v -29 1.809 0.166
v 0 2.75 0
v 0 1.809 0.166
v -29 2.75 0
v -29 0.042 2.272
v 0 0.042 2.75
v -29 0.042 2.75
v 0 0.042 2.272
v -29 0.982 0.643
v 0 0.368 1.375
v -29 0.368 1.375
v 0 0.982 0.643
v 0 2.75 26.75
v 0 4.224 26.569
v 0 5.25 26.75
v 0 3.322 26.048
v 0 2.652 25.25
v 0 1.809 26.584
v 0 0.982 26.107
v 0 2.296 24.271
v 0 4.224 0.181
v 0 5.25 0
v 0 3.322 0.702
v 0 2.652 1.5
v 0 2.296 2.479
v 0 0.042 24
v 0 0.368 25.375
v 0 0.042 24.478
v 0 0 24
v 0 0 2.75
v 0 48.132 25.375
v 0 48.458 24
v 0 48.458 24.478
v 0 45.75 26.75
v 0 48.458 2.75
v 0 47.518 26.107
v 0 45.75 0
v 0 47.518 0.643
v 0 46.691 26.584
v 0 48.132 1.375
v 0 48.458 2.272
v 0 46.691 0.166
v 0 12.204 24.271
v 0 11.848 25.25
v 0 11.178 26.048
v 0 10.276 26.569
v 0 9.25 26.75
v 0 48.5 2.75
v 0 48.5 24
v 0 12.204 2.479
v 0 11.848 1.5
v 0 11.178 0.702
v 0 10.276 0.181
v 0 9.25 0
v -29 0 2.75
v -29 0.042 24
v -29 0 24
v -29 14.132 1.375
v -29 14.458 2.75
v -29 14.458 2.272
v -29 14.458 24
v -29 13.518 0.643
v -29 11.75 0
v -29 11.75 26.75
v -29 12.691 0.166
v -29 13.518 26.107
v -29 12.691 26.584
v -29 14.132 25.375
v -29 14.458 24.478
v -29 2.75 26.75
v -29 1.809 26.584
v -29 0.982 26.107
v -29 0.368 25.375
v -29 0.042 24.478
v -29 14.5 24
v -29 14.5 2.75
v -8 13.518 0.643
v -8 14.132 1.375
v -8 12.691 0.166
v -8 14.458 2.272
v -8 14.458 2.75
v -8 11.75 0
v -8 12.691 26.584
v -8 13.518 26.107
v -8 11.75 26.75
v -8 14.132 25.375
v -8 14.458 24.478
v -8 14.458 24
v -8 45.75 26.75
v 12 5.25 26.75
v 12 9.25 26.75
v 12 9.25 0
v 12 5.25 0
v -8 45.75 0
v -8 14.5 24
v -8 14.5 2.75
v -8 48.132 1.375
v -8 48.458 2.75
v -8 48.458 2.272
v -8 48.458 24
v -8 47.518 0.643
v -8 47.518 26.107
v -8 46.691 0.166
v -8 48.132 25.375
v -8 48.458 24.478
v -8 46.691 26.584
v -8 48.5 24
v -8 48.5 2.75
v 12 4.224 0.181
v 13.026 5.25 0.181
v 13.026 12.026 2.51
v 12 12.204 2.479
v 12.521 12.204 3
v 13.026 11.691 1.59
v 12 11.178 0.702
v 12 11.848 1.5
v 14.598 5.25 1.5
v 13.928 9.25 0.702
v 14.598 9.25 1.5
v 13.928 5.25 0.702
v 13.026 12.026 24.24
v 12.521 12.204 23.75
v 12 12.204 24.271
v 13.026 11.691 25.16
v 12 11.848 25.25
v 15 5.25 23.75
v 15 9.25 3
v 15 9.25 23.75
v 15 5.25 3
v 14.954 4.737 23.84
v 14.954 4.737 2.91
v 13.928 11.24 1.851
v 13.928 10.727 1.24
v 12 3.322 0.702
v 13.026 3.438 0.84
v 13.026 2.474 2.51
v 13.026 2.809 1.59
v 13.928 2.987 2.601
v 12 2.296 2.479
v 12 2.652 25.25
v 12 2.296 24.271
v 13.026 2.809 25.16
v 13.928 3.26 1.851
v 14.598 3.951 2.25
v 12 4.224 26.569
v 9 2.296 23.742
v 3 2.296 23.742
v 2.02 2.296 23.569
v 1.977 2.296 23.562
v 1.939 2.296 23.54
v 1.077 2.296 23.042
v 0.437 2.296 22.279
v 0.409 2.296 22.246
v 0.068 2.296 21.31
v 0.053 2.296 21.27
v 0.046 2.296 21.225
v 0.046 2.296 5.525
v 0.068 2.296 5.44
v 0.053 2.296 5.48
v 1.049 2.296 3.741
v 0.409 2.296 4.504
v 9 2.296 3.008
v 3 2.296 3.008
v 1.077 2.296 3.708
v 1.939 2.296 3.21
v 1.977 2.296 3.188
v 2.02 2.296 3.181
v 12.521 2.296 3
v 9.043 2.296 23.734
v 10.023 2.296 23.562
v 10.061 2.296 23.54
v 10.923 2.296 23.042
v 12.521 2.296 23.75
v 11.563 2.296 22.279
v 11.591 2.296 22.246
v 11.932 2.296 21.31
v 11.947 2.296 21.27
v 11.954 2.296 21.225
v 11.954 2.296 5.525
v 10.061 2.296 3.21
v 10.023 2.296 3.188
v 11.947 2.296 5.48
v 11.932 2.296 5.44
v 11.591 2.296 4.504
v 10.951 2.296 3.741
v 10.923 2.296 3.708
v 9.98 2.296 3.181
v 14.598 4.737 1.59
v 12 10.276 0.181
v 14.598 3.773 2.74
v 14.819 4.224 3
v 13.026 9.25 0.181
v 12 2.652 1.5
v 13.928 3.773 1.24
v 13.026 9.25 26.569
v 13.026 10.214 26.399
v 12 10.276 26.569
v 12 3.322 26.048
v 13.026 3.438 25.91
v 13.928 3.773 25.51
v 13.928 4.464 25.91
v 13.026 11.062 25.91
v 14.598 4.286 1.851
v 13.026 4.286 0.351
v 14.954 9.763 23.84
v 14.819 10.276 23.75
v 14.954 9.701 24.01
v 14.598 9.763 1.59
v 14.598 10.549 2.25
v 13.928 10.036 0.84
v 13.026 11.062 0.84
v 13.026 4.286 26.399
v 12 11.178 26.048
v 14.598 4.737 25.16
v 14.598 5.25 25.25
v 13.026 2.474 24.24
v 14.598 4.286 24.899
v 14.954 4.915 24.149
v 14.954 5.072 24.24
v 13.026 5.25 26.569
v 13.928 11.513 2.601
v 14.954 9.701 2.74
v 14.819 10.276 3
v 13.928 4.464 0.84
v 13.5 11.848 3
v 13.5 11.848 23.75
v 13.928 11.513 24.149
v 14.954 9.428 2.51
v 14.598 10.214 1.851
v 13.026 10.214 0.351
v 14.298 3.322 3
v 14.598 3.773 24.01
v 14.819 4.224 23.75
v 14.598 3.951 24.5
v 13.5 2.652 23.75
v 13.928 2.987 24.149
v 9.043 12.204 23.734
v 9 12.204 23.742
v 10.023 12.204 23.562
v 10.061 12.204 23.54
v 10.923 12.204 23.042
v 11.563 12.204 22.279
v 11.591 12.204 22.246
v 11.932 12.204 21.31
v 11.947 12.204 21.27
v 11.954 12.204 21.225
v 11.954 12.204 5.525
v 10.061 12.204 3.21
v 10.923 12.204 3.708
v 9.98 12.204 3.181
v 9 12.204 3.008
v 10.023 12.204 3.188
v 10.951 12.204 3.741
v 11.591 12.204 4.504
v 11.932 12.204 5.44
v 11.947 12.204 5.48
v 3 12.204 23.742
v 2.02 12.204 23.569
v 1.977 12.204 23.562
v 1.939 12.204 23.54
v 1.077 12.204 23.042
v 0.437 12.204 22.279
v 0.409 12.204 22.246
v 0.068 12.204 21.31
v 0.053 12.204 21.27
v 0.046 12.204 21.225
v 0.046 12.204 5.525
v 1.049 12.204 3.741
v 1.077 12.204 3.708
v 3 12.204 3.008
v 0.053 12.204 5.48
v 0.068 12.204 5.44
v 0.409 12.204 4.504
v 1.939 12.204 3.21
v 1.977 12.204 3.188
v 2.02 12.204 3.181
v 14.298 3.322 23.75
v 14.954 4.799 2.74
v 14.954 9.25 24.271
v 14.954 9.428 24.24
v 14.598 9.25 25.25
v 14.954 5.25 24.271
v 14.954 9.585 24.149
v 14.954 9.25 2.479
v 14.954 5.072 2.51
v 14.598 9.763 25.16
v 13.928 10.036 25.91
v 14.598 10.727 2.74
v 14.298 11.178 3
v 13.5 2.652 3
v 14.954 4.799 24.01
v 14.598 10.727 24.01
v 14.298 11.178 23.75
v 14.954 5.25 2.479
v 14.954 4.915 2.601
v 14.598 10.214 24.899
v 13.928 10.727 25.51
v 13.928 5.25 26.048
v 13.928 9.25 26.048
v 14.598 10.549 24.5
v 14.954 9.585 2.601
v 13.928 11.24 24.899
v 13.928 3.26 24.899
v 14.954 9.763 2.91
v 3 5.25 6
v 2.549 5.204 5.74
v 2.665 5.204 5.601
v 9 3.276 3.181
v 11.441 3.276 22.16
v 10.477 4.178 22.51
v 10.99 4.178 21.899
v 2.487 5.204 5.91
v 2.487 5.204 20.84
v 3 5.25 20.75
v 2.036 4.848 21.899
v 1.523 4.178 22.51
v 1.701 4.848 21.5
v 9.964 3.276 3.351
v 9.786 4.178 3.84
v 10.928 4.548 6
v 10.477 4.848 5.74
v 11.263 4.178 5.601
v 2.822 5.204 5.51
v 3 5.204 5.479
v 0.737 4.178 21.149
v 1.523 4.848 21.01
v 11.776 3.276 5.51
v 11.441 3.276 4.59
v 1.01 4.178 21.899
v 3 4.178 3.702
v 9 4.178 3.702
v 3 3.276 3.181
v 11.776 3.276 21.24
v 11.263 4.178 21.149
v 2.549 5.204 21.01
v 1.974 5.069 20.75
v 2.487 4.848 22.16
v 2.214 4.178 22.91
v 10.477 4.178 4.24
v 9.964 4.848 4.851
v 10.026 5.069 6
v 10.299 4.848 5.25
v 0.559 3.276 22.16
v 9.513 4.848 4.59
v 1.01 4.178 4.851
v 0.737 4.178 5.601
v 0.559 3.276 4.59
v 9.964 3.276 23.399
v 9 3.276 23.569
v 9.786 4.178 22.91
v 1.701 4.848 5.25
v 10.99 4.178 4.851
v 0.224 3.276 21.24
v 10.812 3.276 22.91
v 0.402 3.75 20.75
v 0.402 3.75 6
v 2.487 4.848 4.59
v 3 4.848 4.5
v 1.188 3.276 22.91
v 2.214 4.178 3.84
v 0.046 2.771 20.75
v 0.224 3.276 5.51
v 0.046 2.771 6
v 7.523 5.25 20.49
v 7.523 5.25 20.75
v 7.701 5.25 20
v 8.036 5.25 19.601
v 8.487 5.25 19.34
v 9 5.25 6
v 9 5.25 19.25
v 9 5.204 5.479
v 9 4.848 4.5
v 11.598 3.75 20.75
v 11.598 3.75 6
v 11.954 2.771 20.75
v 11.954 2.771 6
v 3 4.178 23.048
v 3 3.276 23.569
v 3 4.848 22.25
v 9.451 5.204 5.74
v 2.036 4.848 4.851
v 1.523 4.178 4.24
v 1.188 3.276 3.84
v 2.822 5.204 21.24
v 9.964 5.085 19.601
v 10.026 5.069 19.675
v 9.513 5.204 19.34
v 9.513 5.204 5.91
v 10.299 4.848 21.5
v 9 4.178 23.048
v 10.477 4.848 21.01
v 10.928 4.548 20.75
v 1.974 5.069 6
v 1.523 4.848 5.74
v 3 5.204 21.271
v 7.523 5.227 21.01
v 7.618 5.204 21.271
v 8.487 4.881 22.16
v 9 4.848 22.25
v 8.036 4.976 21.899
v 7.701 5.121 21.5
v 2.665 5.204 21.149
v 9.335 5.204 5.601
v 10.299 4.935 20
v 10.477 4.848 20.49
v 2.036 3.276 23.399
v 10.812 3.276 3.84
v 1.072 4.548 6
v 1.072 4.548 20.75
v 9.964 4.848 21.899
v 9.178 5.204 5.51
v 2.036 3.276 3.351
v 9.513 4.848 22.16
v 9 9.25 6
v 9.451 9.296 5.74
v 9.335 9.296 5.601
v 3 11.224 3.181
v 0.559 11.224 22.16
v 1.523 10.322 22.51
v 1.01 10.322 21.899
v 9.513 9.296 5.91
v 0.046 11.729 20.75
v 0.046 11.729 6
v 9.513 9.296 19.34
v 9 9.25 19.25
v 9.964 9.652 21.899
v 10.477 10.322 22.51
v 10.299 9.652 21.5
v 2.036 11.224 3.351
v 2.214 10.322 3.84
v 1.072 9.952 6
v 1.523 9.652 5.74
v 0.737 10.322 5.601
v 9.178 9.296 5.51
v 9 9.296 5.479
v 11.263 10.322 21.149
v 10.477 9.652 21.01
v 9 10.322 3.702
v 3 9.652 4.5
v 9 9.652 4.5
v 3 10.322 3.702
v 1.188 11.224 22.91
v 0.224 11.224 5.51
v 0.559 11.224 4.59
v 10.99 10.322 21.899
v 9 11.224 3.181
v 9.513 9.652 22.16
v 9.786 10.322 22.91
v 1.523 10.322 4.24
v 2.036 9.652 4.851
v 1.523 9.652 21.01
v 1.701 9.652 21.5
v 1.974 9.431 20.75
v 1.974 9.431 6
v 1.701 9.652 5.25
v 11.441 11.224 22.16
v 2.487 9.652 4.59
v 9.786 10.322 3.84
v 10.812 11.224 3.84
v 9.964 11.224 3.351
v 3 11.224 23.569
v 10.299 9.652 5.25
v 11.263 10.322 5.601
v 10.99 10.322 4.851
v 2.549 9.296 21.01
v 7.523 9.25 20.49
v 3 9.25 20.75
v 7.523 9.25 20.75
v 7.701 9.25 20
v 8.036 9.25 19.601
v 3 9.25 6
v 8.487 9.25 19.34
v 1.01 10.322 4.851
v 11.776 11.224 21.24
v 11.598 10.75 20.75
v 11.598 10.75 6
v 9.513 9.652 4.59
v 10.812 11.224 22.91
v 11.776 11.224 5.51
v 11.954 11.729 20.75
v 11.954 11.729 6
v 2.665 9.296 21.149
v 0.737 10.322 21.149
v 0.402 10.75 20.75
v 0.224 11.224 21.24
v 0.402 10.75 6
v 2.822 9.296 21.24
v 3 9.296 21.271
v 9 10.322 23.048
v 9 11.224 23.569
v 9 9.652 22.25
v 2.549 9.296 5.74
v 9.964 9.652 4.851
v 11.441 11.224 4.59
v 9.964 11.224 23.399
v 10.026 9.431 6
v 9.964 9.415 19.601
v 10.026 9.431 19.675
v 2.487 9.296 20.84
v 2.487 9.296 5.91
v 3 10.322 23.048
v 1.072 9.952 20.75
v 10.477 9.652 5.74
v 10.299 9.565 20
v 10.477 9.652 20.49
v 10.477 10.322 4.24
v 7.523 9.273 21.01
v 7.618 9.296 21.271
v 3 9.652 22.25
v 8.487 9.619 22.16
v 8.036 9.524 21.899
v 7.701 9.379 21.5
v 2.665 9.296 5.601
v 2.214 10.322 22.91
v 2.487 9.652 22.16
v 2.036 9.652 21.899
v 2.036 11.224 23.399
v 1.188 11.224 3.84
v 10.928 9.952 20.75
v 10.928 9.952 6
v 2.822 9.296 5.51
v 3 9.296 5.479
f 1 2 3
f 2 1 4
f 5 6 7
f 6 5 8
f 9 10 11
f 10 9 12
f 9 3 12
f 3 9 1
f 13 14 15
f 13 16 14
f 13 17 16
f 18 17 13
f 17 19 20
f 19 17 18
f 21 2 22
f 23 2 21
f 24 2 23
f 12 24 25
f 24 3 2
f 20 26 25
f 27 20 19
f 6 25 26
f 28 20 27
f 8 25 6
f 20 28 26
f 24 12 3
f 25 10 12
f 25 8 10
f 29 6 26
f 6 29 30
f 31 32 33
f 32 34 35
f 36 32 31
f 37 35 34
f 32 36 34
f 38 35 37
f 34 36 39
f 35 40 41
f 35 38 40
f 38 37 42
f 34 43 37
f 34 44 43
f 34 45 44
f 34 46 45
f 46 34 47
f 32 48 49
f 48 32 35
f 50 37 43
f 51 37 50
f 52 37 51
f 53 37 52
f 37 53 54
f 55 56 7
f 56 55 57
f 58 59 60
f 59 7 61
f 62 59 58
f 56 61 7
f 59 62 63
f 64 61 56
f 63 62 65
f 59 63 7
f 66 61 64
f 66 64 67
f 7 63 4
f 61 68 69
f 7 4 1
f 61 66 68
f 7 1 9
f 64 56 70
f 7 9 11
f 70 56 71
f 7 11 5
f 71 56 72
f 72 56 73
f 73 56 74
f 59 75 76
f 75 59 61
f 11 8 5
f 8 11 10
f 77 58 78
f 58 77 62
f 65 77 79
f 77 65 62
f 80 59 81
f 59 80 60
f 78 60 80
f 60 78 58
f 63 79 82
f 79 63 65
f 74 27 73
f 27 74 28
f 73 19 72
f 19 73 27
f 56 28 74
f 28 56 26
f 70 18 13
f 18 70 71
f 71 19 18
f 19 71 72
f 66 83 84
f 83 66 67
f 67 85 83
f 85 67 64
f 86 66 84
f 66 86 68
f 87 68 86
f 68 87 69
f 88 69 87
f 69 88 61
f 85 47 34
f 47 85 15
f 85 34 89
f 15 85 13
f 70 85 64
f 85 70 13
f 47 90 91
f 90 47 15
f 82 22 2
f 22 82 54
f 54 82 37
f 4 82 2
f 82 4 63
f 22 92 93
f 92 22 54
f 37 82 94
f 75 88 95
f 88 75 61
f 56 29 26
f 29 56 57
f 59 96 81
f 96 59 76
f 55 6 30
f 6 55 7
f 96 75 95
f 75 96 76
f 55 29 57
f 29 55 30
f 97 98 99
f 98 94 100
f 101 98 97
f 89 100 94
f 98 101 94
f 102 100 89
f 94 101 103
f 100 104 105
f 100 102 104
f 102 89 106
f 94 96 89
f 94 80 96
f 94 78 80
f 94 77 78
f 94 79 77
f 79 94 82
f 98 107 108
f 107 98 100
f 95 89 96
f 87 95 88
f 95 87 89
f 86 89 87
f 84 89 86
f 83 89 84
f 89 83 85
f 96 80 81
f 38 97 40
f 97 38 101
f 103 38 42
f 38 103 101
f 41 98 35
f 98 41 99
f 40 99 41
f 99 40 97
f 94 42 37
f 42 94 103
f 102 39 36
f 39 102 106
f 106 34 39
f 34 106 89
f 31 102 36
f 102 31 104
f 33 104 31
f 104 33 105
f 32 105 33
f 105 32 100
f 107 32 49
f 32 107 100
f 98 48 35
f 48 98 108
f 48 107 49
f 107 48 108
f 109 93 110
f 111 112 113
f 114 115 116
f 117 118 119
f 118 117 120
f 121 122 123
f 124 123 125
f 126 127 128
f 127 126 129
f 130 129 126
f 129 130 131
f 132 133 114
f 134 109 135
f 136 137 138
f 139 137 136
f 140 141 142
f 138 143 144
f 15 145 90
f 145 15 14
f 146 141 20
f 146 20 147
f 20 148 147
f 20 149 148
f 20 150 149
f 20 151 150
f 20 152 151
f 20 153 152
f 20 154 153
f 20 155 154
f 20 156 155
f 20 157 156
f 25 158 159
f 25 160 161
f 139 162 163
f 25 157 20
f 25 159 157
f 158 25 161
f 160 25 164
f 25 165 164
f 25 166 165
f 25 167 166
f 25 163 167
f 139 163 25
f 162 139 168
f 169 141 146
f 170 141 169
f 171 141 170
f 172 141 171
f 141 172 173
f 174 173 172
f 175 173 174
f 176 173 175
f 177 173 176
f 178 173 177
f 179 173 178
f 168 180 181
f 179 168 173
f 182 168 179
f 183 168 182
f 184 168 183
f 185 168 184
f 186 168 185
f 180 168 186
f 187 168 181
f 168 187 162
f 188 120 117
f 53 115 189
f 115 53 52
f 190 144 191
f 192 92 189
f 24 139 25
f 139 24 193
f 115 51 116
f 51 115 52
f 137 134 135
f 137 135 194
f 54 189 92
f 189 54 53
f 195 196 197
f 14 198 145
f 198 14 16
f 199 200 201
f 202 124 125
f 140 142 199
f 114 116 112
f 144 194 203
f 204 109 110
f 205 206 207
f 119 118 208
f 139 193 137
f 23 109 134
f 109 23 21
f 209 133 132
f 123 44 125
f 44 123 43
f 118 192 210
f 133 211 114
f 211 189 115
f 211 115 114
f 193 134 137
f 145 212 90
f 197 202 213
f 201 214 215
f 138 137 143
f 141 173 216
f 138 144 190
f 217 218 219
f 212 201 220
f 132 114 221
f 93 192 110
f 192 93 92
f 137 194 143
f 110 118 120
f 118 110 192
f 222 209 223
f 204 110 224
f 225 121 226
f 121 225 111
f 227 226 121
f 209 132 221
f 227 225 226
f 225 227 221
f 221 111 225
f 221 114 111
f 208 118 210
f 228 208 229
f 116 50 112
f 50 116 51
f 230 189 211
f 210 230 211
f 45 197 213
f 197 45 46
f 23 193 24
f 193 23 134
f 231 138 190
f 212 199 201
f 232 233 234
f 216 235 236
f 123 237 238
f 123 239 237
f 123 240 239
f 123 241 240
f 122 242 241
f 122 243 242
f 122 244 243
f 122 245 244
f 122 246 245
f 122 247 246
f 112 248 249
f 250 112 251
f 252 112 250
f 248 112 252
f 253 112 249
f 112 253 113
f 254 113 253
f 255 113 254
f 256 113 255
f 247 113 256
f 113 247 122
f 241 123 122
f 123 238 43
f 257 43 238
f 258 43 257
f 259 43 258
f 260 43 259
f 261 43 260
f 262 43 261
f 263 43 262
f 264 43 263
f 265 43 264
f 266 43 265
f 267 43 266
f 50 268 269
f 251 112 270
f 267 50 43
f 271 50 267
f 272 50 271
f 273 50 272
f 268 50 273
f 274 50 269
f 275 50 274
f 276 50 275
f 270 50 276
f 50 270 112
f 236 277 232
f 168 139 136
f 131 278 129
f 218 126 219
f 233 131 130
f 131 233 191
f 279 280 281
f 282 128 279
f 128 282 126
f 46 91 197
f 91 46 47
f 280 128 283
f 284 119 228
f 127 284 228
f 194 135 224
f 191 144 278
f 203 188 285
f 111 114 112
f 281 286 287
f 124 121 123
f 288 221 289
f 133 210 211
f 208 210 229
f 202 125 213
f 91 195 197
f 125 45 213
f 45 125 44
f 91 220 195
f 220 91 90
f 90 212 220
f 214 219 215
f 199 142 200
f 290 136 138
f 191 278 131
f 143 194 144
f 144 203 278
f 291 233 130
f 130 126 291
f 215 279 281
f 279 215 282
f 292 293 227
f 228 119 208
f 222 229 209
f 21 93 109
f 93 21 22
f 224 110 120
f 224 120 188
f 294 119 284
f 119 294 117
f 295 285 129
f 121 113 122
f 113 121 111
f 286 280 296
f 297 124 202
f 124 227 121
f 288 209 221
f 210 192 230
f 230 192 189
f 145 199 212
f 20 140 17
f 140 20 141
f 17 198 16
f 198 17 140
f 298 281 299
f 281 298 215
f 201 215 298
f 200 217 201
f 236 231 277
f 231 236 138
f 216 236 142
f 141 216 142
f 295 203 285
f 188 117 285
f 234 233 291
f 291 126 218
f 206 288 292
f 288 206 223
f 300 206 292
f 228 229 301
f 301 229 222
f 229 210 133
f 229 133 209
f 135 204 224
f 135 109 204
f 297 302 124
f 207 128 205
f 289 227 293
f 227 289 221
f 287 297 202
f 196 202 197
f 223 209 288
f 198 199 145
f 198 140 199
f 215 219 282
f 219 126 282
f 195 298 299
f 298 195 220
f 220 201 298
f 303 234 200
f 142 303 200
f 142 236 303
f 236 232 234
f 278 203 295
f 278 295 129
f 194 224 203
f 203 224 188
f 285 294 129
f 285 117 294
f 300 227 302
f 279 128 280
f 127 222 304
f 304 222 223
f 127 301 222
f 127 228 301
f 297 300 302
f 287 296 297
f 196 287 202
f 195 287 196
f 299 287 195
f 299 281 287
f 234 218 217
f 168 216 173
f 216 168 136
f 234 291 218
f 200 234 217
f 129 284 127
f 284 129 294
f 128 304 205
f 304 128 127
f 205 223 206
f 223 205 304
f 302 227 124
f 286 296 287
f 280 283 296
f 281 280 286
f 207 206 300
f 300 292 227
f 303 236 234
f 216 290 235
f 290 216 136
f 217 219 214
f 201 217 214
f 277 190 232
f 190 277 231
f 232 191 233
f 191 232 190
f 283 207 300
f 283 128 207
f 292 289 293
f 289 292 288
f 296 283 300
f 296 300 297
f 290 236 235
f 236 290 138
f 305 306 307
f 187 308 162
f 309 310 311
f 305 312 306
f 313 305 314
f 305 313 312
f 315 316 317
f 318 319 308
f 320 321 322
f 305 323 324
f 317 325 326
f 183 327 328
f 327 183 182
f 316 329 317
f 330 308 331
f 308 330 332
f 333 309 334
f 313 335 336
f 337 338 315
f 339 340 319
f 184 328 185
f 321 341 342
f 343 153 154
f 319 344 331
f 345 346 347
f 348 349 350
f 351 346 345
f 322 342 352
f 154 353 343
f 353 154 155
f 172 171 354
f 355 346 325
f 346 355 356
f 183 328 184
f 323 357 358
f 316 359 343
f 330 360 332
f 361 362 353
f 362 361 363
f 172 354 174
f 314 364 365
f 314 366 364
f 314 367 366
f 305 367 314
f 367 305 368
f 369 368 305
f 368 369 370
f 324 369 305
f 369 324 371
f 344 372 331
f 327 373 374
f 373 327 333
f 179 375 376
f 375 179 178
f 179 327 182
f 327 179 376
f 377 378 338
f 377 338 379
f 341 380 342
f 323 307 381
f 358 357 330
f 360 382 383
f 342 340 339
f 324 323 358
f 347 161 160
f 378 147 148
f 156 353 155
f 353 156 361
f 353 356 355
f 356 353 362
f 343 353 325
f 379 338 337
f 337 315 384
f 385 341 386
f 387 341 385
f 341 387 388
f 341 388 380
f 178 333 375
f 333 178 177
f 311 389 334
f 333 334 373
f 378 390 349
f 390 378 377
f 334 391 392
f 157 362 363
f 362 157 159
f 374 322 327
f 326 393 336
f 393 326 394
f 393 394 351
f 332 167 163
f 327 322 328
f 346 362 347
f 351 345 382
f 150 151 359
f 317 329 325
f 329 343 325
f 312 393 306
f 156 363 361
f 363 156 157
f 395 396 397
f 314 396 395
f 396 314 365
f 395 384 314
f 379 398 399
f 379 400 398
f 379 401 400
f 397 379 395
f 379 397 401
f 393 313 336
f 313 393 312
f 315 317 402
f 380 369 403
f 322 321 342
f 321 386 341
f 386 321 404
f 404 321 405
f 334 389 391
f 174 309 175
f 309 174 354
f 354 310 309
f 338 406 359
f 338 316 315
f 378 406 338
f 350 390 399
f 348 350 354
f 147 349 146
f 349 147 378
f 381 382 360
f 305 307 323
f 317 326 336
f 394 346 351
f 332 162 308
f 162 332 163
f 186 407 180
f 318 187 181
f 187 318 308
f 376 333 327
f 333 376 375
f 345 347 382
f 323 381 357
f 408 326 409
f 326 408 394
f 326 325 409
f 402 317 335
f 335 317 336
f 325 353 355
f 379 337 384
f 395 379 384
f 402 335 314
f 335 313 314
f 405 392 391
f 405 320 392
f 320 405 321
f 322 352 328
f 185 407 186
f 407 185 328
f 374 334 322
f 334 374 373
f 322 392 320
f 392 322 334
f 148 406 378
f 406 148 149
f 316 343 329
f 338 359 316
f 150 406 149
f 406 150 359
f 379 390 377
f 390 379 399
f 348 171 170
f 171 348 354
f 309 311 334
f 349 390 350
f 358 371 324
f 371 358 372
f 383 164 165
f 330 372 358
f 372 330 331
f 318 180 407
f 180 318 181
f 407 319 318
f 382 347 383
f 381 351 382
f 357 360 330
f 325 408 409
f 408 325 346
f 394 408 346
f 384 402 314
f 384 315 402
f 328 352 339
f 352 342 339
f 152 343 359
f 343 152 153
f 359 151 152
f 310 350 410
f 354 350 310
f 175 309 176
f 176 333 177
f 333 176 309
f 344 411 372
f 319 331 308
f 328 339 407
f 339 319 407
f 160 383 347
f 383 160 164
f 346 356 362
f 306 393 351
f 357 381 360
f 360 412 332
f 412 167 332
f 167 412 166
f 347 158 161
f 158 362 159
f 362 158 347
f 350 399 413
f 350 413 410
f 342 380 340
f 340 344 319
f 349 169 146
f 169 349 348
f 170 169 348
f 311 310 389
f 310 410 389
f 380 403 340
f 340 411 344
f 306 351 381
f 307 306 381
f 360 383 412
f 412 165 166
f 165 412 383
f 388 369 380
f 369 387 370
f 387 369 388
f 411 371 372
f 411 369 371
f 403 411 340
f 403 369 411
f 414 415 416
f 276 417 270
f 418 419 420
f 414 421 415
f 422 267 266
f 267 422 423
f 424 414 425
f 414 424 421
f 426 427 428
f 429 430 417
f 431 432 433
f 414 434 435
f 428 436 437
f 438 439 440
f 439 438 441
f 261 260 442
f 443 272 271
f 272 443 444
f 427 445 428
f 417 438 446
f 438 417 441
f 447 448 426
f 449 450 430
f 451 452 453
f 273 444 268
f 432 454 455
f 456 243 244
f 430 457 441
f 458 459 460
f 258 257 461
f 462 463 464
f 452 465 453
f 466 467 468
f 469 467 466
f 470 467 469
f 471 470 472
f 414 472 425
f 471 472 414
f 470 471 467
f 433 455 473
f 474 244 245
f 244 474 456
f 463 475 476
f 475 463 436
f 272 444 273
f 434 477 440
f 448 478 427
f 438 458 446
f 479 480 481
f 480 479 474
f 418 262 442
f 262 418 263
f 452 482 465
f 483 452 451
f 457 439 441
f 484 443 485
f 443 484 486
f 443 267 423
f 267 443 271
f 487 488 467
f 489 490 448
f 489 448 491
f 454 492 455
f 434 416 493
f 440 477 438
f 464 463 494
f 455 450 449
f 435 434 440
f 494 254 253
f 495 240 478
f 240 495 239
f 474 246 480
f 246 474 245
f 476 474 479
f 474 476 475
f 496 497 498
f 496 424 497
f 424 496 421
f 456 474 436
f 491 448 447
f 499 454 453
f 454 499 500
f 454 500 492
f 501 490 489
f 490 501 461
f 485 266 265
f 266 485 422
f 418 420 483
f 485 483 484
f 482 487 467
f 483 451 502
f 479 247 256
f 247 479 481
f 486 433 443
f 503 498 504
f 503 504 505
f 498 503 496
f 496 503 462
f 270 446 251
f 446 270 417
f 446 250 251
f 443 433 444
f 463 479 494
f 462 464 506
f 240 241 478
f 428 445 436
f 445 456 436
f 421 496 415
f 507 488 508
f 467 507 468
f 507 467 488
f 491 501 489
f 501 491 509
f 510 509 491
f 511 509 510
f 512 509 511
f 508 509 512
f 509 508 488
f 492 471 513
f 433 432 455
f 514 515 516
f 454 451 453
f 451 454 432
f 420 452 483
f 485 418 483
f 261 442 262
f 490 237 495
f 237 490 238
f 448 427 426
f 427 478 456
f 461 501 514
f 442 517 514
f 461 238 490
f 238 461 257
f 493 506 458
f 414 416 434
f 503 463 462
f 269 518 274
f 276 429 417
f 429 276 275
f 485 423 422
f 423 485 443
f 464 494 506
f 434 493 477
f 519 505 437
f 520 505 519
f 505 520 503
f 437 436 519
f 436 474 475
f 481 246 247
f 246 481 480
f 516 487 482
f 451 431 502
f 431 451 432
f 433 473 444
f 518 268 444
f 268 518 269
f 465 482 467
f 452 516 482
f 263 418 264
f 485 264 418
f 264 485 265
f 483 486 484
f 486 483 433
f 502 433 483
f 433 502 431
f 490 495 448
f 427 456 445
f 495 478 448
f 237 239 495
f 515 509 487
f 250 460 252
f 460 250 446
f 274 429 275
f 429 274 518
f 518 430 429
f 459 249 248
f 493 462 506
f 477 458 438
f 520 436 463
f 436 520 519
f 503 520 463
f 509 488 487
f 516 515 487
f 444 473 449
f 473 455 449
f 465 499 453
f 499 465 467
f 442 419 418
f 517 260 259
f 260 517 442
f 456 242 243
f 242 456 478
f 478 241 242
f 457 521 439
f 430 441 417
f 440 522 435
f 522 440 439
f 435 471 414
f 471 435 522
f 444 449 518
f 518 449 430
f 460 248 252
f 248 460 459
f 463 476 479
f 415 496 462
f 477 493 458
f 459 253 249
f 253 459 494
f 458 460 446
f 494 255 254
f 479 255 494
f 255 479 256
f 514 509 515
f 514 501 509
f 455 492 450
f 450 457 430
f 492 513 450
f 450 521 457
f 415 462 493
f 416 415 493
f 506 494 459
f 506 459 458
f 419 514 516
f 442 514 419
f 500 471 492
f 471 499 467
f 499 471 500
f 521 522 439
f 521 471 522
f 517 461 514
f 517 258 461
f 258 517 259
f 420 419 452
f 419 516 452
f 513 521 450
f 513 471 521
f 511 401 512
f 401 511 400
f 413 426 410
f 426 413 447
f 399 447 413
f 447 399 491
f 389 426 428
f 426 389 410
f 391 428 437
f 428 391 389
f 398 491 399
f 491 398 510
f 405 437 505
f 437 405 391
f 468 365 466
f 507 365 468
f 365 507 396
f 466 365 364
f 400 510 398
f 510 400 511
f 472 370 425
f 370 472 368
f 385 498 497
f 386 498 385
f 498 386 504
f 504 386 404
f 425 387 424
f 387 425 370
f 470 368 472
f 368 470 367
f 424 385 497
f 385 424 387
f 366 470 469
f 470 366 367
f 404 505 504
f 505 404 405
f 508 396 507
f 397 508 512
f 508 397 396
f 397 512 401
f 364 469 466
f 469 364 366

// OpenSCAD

// Door bolt hole height; must be a tight fit
bolt_hole_height = 26.75;
// Door bolt hole width; must be a tight fit
bolt_hole_width = 14.5;
// Door bolt hole depth
bolt_hole_depth = 21;

// Door bolt hole corner radius
bolt_hole_corner_radius = 2.75;

// Door stopper tongue length; must be long enough so gap between door and frame is sufficiently large
tongue_length = 34;
// Door stopper tongue thickness; must be thick enough so door is blocked and doesn't slide past tongue
tongue_thickness = 8;

// Pull handle inset (determines handle width = bolt hole width - 2 * inset)
handle_inset = 2.25;
// Pull handle length
handle_length = 15;
// Whether to include a hole (for a strap to hang from door when not inserted) or not
handle_hole = true;


/* [Hidden] */

// Door tongue inset dimensions
h = bolt_hole_height;
w = bolt_hole_width;
d = bolt_hole_depth;

rad = bolt_hole_corner_radius;

// Door parameters
l = tongue_length;
thk = tongue_thickness;

// Handle parameters
h_inset = handle_inset;
h_d = handle_length;
hole_r = 3/2;
hole = handle_hole;

h_w = w - 2*h_inset;  // must be <= w
h_or = 3;  // outer corner rounding radius
h_ir = 3;  // inner rounding radius
h_rim = 3; // finger notch rim

$fn=18;

// ****  FROM lib/util.scad
module roundedCube4(dim, r, center=false) {
  width = dim[0];
  height = dim[1];
  depth = dim[2];
  centerx = (center[0] == undef ? center : center[0]);
  centery = (center[1] == undef ? center : center[1]);
  centerz = (center[2] == undef ? center : center[2]);
  translate([centerx ? -width/2 : 0, centery ? -height/2 : 0, centerz ? -depth/2 : 0]) union() {
    translate([0, r, 0]) cube([width, height-2*r, depth]);
    translate([r, 0, 0]) cube([width-2*r, height, depth]);
    for (xy = [[r, r],
               [r, height-r],
               [width-r, r],
               [width-r, height-r]]) {
      translate([xy[0], xy[1], 0]) cylinder(r = r, h = depth);
    }
  }
}

// TODO FIXME: dim[2] is not obeyed and top is filleted when dim[2] is >r but <2*r, because corner sphere diameter exceeds height  (should be a half-sphere, in principle)
module roundedCube6(dim, r, center=false) {
  width = dim[0];
  height = dim[1];
  depth = dim[2];
  centerx = (center[0] == undef ? center : center[0]);
  centery = (center[1] == undef ? center : center[1]);
  centerz = (center[2] == undef ? center : center[2]);
  translate([r - (centerx ? width/2 : 0), r - (centery ? height/2 : 0), r - (centerz ? depth/2 : 0)]) hull() {
    // Edges
    translate([0, 0, 0]) rotate([-90, 0, 0]) cylinder(h = height-2*r,r = r);
    translate([width-2*r, 0, 0]) rotate([-90, 0, 0]) cylinder(h = height-2*r,r = r);
    translate([0, 0, 0]) rotate([0, 90, 0]) cylinder(h = width-2*r, r = r);
    translate([0, height-2*r, 0]) rotate([0, 90, 0]) cylinder(h = width-2*r, r = r);
    translate([0, 0, 0]) cylinder(h = depth-r, r = r);
    translate([width-2*r, 0, 0]) cylinder(h = depth-r, r = r);
    translate([0, height-2*r, 0]) cylinder(h = depth-r, r = r);
    translate([width-2*r, height-2*r, 0]) cylinder(h = depth-r, r = r);

    // Corners
    translate([0,0,0]) sphere(r);
    translate([width-2*r, 0, 0]) sphere(r);
    translate([0, height-2*r, 0]) sphere(r);
    translate([width-2*r, height-2*r, 0]) sphere(r);
  }
}

//  *****  END FROM lib/util.scad

rotate([0, -90, 0]) union() {
  roundedCube4([h, w, d+thk], r=rad);
  roundedCube4([h, w+l, thk], r=rad);
  translate([0, (w-h_w)/2, -h_d]) difference() {
    roundedCube6([h, h_w, h_d+thk], r=h_or);
    translate([h_rim, h_rim, h_rim]) rotate([90, 0, 0]) roundedCube6([h-2*h_rim, h_d-h_rim, 2*h_rim], r=h_ir);
    translate([h_rim, h_w-h_rim, h_d]) rotate([-90, 0, 0]) roundedCube6([h-2*h_rim, h_d-h_rim, 2*h_rim], r=h_ir);  
    if (hole) {
      translate([h-h_rim-h_ir, -1, h_rim+h_ir]) rotate([-90, 0, 0]) cylinder(r=hole_r, h=h_w+2);
    } 
  }
}

